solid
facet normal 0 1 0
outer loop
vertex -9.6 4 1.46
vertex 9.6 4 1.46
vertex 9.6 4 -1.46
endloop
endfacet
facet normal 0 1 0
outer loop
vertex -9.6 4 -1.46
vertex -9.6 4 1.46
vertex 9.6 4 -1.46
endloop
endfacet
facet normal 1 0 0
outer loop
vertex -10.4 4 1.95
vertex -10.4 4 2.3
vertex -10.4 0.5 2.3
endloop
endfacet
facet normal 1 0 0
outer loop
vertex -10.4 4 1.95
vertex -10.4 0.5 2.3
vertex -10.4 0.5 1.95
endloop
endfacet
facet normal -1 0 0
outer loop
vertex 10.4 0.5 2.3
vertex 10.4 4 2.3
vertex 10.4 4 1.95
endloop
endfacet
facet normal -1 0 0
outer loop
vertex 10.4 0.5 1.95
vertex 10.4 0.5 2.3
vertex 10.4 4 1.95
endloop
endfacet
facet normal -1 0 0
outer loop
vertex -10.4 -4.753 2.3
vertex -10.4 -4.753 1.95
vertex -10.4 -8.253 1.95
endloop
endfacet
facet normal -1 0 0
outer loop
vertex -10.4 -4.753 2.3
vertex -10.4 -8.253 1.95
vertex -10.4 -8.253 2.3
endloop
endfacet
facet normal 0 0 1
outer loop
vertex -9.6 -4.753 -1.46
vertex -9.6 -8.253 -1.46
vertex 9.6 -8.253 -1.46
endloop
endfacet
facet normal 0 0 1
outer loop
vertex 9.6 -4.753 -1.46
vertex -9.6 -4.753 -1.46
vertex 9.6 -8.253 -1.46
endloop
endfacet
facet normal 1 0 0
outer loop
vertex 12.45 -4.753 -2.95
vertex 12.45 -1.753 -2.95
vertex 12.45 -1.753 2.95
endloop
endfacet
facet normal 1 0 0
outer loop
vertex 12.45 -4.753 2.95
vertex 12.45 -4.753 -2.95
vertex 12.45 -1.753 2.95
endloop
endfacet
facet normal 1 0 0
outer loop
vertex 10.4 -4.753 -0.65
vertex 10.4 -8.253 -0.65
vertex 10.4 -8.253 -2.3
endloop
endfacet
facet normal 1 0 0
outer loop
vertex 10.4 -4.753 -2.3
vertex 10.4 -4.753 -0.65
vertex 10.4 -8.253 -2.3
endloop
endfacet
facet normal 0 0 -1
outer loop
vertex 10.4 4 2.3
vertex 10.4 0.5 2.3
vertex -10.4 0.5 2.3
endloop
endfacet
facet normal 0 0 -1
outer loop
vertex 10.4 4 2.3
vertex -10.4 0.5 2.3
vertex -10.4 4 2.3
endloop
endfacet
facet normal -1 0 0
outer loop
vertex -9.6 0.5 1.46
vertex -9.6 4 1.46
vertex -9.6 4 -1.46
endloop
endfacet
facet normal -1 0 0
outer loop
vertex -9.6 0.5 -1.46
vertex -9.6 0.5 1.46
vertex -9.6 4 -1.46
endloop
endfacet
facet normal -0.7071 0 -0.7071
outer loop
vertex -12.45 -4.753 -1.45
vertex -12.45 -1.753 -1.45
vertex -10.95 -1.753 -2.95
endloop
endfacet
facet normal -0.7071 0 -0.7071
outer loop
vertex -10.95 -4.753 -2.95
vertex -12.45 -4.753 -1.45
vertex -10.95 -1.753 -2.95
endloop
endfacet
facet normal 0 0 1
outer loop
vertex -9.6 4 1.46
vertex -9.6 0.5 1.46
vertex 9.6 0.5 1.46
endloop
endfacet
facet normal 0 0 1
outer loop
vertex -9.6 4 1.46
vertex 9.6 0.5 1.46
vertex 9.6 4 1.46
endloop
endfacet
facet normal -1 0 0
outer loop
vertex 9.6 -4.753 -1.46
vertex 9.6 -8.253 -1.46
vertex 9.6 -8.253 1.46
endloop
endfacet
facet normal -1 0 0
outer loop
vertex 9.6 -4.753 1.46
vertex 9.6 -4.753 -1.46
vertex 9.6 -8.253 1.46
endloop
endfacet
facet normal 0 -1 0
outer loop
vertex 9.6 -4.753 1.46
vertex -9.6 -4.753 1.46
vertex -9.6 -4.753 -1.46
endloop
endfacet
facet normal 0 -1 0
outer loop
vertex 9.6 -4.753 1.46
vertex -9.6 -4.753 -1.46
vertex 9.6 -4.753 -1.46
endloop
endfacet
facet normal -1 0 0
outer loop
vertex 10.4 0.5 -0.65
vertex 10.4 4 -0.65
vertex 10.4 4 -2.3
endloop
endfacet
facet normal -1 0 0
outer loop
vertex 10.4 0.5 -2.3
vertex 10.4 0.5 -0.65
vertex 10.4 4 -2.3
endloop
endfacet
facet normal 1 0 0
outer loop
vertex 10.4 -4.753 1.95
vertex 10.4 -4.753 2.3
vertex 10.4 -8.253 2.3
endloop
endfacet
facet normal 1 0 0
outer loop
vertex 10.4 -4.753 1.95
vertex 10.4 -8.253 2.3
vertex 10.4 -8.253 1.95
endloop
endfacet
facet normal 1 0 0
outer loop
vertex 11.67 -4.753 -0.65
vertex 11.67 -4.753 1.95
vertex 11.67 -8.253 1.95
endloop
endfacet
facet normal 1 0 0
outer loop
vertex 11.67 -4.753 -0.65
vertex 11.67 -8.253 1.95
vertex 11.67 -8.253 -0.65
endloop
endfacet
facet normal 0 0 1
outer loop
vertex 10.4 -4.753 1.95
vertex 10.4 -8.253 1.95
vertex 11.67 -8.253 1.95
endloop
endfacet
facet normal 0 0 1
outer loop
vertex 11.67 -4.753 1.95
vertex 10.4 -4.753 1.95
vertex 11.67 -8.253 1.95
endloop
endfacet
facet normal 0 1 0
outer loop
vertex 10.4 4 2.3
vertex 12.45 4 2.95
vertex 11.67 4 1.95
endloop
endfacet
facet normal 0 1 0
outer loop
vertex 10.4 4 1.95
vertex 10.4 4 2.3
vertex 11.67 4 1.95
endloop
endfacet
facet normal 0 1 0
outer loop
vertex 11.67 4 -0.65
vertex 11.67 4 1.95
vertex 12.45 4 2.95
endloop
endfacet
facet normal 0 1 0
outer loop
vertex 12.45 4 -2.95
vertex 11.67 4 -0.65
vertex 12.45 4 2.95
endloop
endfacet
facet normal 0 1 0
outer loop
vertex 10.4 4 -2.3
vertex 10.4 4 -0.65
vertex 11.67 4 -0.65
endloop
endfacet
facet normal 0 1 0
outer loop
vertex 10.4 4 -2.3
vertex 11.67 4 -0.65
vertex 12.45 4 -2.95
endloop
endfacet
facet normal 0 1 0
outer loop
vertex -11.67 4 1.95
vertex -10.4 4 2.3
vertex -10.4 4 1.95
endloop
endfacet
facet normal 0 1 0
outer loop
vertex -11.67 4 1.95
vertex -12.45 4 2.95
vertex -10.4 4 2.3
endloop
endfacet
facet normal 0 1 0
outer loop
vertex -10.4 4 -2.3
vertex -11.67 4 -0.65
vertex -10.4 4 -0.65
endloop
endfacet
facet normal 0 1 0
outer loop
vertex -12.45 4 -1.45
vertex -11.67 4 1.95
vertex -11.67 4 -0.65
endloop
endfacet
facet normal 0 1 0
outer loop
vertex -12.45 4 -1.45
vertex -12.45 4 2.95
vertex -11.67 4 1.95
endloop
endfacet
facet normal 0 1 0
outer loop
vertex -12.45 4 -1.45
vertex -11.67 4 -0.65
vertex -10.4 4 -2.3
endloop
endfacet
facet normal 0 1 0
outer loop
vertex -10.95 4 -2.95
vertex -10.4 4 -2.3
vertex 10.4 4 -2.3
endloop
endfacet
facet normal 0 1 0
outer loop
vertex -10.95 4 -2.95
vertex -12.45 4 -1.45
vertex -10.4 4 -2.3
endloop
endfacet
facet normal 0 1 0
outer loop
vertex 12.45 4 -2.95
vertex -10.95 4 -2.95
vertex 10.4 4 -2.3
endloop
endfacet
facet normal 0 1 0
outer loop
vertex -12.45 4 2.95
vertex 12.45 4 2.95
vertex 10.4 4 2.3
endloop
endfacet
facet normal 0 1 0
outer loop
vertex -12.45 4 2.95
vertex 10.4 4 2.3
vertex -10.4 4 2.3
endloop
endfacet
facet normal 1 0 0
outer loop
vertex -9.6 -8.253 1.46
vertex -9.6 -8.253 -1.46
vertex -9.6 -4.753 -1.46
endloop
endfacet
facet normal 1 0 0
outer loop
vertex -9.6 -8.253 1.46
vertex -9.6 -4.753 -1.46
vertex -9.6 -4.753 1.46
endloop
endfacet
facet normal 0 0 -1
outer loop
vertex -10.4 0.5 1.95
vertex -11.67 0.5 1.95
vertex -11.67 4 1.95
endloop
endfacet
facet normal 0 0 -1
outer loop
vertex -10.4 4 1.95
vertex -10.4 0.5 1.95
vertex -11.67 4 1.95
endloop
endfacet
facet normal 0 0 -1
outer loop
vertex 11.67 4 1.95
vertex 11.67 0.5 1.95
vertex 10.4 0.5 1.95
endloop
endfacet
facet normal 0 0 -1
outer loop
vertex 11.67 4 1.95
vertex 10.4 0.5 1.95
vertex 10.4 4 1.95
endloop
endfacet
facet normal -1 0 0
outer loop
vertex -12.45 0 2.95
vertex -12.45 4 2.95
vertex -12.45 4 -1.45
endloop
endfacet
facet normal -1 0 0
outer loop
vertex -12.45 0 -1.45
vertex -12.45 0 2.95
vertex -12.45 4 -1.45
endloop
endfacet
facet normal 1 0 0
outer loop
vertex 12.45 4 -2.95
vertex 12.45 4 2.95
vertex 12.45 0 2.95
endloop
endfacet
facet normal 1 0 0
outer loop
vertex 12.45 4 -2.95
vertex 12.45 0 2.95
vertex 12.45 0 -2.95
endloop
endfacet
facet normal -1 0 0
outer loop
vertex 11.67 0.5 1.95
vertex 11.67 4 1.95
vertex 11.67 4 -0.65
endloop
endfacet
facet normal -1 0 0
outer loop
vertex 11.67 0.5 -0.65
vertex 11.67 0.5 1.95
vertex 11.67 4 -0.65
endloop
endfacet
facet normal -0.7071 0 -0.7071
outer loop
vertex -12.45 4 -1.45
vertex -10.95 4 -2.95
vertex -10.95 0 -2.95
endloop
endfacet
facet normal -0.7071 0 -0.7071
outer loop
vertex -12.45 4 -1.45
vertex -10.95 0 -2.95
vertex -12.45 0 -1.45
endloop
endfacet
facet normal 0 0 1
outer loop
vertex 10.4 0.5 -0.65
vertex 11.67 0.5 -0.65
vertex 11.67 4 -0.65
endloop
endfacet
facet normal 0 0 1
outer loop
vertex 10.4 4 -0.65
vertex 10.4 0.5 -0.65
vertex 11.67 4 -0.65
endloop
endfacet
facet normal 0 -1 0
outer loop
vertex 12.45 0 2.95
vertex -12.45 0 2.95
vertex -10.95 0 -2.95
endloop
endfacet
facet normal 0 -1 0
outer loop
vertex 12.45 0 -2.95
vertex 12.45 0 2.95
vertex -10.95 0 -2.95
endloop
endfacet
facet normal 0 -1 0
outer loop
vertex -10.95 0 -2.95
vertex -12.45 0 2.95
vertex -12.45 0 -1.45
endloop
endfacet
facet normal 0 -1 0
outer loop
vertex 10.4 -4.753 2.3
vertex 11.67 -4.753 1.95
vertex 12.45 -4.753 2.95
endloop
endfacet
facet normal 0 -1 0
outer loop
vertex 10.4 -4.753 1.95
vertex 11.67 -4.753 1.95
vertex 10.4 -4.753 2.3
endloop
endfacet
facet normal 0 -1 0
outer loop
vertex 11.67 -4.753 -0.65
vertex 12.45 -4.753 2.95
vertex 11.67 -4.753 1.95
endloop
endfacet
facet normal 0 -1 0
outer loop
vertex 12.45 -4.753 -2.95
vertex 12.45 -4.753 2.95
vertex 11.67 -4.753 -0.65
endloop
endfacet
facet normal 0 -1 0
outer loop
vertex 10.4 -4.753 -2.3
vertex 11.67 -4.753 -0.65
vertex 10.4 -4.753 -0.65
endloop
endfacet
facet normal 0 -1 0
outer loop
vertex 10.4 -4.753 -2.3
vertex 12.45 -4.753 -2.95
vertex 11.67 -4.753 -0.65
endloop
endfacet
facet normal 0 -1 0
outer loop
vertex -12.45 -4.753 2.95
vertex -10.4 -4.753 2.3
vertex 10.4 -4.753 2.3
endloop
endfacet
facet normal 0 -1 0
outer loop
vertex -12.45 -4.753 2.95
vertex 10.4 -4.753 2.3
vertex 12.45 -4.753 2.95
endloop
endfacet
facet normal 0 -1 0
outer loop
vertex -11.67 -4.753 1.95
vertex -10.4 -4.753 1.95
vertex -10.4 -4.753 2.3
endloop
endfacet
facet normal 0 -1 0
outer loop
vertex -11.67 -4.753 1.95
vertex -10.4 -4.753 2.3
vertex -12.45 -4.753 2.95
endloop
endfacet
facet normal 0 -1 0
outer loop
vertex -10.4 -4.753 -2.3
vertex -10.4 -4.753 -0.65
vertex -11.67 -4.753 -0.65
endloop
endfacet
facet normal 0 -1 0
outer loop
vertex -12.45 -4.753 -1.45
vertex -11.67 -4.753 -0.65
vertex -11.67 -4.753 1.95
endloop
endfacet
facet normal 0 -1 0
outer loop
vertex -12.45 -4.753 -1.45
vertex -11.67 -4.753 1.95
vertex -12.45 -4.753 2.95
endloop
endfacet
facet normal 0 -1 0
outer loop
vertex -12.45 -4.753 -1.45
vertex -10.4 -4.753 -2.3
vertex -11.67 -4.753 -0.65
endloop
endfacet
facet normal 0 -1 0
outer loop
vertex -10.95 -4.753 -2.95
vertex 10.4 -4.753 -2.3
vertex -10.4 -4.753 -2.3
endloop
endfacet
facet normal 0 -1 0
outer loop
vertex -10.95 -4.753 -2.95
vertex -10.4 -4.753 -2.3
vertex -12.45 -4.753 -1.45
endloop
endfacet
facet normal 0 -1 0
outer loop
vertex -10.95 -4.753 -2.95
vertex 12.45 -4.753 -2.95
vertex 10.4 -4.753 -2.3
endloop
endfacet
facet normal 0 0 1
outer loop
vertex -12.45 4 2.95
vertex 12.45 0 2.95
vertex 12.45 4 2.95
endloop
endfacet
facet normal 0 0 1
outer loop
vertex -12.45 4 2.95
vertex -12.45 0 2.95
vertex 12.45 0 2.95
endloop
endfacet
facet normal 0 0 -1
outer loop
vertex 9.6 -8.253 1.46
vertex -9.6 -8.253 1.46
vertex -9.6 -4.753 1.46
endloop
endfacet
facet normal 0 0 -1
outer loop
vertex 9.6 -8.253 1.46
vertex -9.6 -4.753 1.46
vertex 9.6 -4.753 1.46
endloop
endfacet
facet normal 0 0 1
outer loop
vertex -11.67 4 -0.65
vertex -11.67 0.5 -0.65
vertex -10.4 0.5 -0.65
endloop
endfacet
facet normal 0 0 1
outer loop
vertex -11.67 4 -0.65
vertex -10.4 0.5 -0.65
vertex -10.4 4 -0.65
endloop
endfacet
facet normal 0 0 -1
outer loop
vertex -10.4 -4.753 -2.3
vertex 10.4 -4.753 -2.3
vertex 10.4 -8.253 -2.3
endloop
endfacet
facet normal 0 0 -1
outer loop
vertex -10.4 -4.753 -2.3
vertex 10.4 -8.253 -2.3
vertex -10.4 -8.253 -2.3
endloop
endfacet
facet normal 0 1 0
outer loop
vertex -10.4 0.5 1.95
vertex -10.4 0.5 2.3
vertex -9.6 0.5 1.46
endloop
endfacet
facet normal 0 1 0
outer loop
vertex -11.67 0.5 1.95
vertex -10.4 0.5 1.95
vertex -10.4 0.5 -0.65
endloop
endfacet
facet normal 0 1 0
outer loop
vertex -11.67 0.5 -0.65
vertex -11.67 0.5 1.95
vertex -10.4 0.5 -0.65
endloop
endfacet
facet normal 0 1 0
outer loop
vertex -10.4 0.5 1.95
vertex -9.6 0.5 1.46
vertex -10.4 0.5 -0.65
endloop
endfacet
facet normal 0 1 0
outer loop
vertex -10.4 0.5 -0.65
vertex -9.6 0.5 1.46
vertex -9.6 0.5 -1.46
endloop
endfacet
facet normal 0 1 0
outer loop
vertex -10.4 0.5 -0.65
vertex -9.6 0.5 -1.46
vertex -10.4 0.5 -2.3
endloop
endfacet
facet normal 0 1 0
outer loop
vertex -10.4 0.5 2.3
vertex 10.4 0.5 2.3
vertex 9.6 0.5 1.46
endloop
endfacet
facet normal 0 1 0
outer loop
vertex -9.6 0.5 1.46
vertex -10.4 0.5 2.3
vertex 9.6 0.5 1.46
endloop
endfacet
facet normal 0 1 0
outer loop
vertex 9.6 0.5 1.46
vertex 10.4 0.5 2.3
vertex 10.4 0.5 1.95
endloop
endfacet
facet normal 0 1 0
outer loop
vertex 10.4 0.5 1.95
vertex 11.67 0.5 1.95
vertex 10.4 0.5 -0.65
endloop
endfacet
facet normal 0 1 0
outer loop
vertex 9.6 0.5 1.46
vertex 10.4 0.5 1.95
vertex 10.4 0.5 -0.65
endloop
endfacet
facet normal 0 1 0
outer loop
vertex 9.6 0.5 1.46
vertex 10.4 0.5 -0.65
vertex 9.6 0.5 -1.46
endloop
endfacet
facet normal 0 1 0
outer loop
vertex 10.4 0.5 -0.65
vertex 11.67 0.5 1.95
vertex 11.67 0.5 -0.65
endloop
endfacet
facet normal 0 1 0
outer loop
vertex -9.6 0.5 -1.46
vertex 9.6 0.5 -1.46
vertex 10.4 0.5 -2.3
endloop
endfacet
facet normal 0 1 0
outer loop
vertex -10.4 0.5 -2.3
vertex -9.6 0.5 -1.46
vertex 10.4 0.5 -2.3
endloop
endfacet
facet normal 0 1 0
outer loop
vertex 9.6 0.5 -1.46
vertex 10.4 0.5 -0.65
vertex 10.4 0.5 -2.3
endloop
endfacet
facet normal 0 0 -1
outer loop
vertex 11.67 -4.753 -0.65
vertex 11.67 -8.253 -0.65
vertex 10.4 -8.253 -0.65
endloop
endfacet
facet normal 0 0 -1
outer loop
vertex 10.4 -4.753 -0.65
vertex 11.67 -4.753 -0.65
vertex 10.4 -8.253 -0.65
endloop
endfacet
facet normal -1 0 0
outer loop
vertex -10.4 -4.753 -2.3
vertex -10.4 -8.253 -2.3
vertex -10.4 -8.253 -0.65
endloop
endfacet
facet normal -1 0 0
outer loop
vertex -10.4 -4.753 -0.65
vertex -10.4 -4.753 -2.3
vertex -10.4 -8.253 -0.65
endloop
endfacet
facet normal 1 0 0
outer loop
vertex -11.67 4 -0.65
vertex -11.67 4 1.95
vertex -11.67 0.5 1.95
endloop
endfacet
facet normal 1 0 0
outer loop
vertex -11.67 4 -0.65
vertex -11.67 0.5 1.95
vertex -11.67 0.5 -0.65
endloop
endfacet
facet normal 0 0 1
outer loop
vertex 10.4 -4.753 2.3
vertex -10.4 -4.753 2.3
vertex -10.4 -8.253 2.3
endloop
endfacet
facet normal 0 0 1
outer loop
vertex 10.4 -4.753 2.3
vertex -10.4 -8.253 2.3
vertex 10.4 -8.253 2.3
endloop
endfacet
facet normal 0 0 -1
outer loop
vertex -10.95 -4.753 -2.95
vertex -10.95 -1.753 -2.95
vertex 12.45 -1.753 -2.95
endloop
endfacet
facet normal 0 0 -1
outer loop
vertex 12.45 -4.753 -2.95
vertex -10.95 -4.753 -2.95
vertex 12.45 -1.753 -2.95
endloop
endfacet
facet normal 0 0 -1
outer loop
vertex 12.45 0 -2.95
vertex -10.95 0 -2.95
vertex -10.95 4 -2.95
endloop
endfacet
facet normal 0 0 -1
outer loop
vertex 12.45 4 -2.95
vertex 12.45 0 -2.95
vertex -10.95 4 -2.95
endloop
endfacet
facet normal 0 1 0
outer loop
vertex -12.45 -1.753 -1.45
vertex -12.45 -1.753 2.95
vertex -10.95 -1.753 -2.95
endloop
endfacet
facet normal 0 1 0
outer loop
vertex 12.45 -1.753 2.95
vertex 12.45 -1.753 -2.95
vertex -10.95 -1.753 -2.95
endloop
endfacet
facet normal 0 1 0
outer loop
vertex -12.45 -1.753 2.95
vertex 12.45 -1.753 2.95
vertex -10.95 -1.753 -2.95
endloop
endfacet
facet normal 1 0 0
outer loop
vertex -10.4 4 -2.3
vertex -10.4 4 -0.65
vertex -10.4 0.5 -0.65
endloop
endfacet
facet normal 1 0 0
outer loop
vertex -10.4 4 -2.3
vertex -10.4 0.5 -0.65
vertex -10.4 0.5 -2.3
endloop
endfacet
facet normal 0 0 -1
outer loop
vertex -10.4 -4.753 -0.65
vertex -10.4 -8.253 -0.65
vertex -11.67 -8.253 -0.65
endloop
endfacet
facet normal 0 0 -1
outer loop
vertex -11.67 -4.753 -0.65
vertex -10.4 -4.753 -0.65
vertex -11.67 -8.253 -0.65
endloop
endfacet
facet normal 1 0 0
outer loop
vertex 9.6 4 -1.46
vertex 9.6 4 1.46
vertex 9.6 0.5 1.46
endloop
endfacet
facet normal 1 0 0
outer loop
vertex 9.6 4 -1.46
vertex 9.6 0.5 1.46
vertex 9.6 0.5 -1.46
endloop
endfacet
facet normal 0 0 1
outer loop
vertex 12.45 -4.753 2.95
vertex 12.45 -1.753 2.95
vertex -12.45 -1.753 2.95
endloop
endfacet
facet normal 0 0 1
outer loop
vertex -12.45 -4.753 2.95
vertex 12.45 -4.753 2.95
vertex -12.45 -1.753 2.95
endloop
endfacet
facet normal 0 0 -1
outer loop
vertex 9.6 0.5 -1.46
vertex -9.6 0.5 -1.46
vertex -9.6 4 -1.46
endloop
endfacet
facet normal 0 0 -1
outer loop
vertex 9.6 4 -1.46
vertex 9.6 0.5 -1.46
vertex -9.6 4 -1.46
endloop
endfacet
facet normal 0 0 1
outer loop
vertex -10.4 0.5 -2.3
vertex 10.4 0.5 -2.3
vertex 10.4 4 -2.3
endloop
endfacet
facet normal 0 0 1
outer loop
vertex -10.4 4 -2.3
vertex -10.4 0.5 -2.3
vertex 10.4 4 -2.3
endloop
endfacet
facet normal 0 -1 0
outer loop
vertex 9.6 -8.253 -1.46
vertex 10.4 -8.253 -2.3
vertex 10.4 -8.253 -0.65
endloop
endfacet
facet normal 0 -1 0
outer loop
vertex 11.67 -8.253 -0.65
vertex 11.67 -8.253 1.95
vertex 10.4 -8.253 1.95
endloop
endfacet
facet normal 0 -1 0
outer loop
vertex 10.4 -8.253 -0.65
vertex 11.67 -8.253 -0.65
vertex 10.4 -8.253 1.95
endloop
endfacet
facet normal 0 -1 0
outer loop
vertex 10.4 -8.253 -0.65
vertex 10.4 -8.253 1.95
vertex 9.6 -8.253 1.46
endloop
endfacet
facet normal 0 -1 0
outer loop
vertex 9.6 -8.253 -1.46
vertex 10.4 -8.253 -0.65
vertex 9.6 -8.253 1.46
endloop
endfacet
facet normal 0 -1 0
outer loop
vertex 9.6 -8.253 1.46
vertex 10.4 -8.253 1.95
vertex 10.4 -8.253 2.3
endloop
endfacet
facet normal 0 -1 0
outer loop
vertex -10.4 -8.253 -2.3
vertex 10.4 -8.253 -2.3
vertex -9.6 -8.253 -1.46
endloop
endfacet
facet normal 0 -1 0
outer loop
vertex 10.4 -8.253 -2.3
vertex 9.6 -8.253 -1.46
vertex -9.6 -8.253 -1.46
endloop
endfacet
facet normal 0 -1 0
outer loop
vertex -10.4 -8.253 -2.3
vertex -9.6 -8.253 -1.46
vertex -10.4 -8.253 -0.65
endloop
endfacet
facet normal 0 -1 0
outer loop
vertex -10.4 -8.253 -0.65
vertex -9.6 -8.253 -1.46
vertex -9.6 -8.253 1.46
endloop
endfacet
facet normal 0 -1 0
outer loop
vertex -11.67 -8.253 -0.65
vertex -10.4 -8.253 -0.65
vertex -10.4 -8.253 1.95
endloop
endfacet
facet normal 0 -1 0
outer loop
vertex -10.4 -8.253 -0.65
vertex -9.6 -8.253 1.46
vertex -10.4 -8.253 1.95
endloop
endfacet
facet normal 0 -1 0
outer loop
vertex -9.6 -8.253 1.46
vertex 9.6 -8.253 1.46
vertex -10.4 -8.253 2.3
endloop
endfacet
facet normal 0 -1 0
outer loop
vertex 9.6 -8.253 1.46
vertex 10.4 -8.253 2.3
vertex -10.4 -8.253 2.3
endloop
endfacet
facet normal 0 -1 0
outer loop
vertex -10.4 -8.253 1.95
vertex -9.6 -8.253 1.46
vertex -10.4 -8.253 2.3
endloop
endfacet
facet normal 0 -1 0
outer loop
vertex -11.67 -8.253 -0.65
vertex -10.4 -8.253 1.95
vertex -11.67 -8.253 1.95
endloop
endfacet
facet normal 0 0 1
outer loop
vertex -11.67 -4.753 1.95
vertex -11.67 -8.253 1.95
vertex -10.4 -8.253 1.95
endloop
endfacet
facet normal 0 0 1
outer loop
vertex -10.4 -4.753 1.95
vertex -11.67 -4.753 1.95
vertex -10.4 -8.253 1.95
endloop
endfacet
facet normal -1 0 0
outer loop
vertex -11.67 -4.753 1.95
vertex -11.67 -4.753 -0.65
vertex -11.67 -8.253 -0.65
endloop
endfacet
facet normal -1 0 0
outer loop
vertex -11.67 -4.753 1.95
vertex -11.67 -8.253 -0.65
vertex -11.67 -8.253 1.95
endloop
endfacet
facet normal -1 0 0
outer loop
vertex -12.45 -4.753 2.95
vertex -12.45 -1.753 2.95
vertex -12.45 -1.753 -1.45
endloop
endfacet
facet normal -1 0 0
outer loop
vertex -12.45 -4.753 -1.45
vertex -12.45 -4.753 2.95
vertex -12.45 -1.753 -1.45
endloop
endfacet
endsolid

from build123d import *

# Parameters (mm, degrees)
SKETCH14_W          = 5.9
SKETCH14_H          = 4
BODY_DEPTH          = 12.45
SLOT_A_START        = -10.4
SKETCH17_W          = 4.6
SKETCH17_H          = 3.5
SLOT_A_DEPTH        = 11.4
SLOT_1_START        = -11.67
SKETCH18_W          = 2.6
SKETCH18_H          = 3.5
SLOT_1_DEPTH        = 12.67
BOSS_EXTRUDE3_START = -9.6
SKETCH23_W          = 2.92
SKETCH23_H          = 3.5
BOSS_EXTRUDE3_DEPTH = 9.6
CUT_EXTRUDE1_START  = -1.060820368
SKETCH19_W          = 12.908143914
SKETCH19_H          = 5.38442958
CUT_EXTRUDE1_DEPTH  = 2.060820368
BOSS_EXTRUDE1_DEPTH = 3
BOSS_EXTRUDE2_DEPTH = 3.5
SKETCH24_W          = 19.2
SKETCH24_H          = 2.92
CUT_EXTRUDE2_DEPTH  = 3.5


with BuildPart() as part:
    # Sketch14 → body (new body)
    with BuildSketch(Plane(origin=(0, 0, 0), x_dir=(0, 0, -1), z_dir=(1, 0, 0))):
        with Locations((0, 2)):
            Rectangle(SKETCH14_W, SKETCH14_H)
    extrude(amount=-BODY_DEPTH)

    # Sketch17 → slot-a (cut, through all)
    with BuildSketch(Plane(origin=(0, 0, 0), x_dir=(0, 0, -1), z_dir=(1, 0, 0)).offset(SLOT_A_START)):
        with Locations((0, 2.25)):
            Rectangle(SKETCH17_W, SKETCH17_H)
    extrude(amount=SLOT_A_DEPTH, mode=Mode.SUBTRACT)

    # Sketch18 → slot-1 (cut, through all)
    with BuildSketch(Plane(origin=(0, 0, 0), x_dir=(0, 0, -1), z_dir=(1, 0, 0)).offset(SLOT_1_START)):
        with Locations((-0.65, 2.25)):
            Rectangle(SKETCH18_W, SKETCH18_H)
    extrude(amount=SLOT_1_DEPTH, mode=Mode.SUBTRACT)

    # Sketch23 → Boss-Extrude3 (add)
    with BuildSketch(Plane(origin=(0, 0, 0), x_dir=(0, 0, -1), z_dir=(1, 0, 0)).offset(BOSS_EXTRUDE3_START)):
        with Locations((0, 2.25)):
            Rectangle(SKETCH23_W, SKETCH23_H)
    extrude(amount=BOSS_EXTRUDE3_DEPTH)

    # Mirror2: part across plane


with BuildPart() as part_1:
    add(part.part)
    add(part.part.mirror(Plane(origin=(0, 0, 0), x_dir=(0, 0, 1), z_dir=(1, 0, 0))))

    # Sketch19 → Cut-Extrude1 (cut, through all)
    with BuildSketch(Plane(origin=(-7.7, 0, -7.7), x_dir=(-0.707106781, 0, 0.707106781), z_dir=(-0.707106781, 0, -0.707106781)).offset(CUT_EXTRUDE1_START)):
        with Locations((10.2733597, 2.353779192)):
            Rectangle(SKETCH19_W, SKETCH19_H)
    extrude(amount=CUT_EXTRUDE1_DEPTH, mode=Mode.SUBTRACT)


with BuildPart() as body_2:
    # Sketch20 → Boss-Extrude1 (new body)
    with BuildSketch(Plane(origin=(0, -1.7526, 0), x_dir=(1, 0, 0), z_dir=(0, 1, 0))):
        Polygon((-12.45, -2.95), (-12.45, 1.449773449), (-10.949773449, 2.95), (12.45, 2.95), (12.45, -2.95), align=None)
    extrude(amount=-BOSS_EXTRUDE1_DEPTH)

    # Sketch22 → Boss-Extrude2 (add)
    with BuildSketch(Plane.XZ.offset(4.7526)):
        Polygon((10.4, 2.3), (10.4, 1.95), (11.67, 1.95), (11.67, -0.65), (10.4, -0.65), (10.4, -2.3), (-10.4, -2.3), (-10.4, -0.65), (-11.67, -0.65), (-11.67, 1.95), (-10.4, 1.95), (-10.4, 2.3), align=None)
    extrude(amount=BOSS_EXTRUDE2_DEPTH)

    # Sketch24 → Cut-Extrude2 (cut)
    with BuildSketch(Plane.XZ.offset(8.2526)):
        Rectangle(SKETCH24_W, SKETCH24_H)
    extrude(amount=-CUT_EXTRUDE2_DEPTH, mode=Mode.SUBTRACT)


solid = Compound([part_1.part, body_2.part])
